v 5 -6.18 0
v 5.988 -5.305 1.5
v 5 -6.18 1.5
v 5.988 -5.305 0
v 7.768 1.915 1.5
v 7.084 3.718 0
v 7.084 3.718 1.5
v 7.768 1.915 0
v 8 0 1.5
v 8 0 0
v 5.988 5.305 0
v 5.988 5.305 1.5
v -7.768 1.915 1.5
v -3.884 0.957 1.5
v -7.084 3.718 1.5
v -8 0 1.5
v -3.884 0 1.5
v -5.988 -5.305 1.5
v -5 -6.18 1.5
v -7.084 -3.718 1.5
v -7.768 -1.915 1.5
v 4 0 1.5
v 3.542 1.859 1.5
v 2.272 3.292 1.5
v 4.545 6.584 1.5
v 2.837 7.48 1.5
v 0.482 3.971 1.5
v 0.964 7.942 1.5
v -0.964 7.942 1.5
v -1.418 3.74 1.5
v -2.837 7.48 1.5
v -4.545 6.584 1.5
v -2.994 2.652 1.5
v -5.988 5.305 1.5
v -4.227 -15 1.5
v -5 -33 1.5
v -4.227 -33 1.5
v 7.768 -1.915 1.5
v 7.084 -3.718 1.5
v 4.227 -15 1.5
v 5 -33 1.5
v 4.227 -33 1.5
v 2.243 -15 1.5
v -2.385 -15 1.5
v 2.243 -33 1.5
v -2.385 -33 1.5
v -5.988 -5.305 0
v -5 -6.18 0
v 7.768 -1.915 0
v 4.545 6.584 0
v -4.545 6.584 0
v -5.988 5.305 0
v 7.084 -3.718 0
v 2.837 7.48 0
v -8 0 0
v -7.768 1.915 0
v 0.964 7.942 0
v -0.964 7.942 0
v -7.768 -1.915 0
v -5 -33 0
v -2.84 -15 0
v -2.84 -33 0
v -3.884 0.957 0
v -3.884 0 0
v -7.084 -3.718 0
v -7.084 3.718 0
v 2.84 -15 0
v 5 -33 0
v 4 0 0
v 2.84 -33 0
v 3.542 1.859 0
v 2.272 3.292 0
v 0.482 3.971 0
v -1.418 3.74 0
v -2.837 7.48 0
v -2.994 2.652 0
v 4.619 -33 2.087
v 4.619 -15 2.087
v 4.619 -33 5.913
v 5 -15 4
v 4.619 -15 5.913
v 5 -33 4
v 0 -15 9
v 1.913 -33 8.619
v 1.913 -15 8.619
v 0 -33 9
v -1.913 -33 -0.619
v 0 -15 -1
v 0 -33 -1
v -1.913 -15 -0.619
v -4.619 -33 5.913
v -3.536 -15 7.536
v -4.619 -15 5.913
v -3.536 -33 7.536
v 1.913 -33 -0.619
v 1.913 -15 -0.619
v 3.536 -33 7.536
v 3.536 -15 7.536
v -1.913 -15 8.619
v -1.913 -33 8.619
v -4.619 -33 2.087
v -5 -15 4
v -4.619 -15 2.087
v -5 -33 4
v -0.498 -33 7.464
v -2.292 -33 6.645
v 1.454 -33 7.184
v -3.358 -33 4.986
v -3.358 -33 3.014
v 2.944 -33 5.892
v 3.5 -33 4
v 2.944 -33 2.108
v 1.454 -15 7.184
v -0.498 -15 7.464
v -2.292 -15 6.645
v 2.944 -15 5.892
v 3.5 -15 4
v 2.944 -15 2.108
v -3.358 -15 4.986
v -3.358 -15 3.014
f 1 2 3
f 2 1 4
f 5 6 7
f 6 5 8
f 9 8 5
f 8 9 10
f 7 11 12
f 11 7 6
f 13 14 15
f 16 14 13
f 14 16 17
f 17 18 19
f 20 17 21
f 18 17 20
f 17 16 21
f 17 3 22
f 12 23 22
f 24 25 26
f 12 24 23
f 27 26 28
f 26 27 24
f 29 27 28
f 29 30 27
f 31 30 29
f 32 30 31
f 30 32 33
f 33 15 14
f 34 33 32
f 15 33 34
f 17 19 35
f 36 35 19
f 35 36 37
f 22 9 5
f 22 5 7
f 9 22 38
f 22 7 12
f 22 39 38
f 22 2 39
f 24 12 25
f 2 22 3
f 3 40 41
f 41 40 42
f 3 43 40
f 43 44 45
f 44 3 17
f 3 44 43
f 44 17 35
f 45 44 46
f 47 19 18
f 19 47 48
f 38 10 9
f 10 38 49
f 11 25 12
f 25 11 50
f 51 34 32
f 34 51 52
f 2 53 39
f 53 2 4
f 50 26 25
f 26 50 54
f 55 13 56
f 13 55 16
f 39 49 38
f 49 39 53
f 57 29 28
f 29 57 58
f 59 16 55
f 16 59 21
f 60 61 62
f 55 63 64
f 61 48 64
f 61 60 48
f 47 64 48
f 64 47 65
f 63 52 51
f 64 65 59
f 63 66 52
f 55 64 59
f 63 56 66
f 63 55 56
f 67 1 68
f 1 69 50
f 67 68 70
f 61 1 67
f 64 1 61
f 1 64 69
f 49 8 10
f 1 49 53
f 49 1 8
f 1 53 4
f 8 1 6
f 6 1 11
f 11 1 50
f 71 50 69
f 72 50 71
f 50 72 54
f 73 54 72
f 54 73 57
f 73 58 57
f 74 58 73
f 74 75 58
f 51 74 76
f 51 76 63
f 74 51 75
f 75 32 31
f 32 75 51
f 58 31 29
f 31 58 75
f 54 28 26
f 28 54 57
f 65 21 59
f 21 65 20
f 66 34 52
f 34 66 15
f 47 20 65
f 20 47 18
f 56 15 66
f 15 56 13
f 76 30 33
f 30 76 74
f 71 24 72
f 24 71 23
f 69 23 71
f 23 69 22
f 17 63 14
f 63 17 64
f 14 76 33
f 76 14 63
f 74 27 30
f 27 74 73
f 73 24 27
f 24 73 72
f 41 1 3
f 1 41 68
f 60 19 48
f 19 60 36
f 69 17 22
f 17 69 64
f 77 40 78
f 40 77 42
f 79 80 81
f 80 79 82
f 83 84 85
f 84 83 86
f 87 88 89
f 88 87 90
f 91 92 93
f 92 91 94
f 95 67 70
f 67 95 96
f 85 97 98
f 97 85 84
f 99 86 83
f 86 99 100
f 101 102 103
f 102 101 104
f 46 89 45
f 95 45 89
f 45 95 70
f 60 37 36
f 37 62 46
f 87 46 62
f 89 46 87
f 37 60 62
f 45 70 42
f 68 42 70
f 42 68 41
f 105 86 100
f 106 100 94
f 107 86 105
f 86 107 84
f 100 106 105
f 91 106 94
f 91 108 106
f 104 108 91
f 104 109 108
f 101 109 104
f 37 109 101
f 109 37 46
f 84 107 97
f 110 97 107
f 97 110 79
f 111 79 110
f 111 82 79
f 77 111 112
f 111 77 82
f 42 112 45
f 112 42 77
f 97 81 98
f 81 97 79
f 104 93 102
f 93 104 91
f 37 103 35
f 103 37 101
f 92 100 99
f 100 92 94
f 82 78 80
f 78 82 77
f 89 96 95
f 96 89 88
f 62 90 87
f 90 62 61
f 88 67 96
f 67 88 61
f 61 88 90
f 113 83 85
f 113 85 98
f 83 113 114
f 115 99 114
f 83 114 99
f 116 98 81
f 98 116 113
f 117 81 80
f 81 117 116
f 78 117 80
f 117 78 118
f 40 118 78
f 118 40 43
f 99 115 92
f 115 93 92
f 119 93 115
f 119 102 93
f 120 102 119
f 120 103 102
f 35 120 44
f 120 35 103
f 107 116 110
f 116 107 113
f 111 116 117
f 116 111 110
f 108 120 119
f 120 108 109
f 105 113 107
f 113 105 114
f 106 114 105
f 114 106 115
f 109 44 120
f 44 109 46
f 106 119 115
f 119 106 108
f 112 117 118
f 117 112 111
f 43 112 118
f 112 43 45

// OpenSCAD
// Parameters
type_selector = 0; //[0:1:1]
thickness_mm = 1.5; //[0.8:3:0.1]
overall_length_mm = 40; //[20:80:1]
tab_width_mm = 10; //[5:20:0.5]
outer_diameter_mm = 16; //[10:32:0.5]
inner_diameter_mm = 8; //[4:20:0.5]
bolt_hole_diameter_mm = 6; //[3:12:0.5]
crimp_length_mm = 18; //[8:40:1]
bend_angle_deg = 45; //[0:90:1]
transition_length_mm = 1; //[0.5:5:0.5]
wire_hole_diameter_mm = 4; //[0:10:0.5]
overlap_mm = 1; //[0.5:2:0.1]
eps_mm = 0.2; //[0.05:0.5:0.05]

// Ring Terminal - complete geometry
module ring_terminal() {
  color("Silver") {
    // Ring
    difference() {
      translate([0, 0, thickness_mm / 2])
        cylinder(r=outer_diameter_mm / 2, h=thickness_mm, center=true);
      translate([0, 0, thickness_mm / 2])
        cylinder(r=inner_diameter_mm / 2, h=thickness_mm + 2 * eps_mm, center=true);
      translate([0, 0, thickness_mm / 2])
        cylinder(r=bolt_hole_diameter_mm / 2, h=thickness_mm + 2 * eps_mm, center=true);
    }
    // Tab
    translate([0, -(overall_length_mm - outer_diameter_mm / 2) / 2, thickness_mm / 2])
      cube([tab_width_mm, overall_length_mm - outer_diameter_mm / 2, thickness_mm], center=true);
  }
}

// Ring Terminal Assembly - complete geometry
module ring_terminal_assembly() {
  if (type_selector == 0) {
    // Crimp Barrel Style
    color("Silver") {
      // Crimp Shell
      difference() {
        translate([0, -(overall_length_mm - outer_diameter_mm / 2) + crimp_length_mm / 2 - overlap_mm, tab_width_mm / 2 - overlap_mm])
          rotate([90, 0, 0])
          cylinder(r=tab_width_mm / 2, h=crimp_length_mm, center=true);
        translate([0, -(overall_length_mm - outer_diameter_mm / 2) + crimp_length_mm / 2 - overlap_mm, tab_width_mm / 2 - overlap_mm])
          rotate([90, 0, 0])
          cylinder(r=tab_width_mm / 2 - thickness_mm, h=crimp_length_mm + 2 * eps_mm, center=true);
      }
      // Transition
      translate([0, -(overall_length_mm - outer_diameter_mm / 2) + transition_length_mm / 2 - overlap_mm, thickness_mm / 2])
        cube([tab_width_mm, transition_length_mm, thickness_mm], center=true);
    }
  } else {
    // Bent Tab Style
    color("Silver") {
      // Bent Tab
      difference() {
        translate([0, -(overall_length_mm - outer_diameter_mm / 2) - (overall_length_mm - outer_diameter_mm / 2 - transition_length_mm) / 2 + overlap_mm, thickness_mm / 2])
          rotate([-bend_angle_deg, 0, 0])
          cube([tab_width_mm, overall_length_mm - outer_diameter_mm / 2 - transition_length_mm, thickness_mm], center=true);
        translate([0, -(overall_length_mm - outer_diameter_mm / 2) + (tab_width_mm / 2), thickness_mm / 2])
          rotate([-bend_angle_deg, 0, 0])
          cylinder(r=wire_hole_diameter_mm / 2, h=thickness_mm + 2 * eps_mm, center=true);
      }
      // Transition
      translate([0, -(overall_length_mm - outer_diameter_mm / 2) + transition_length_mm / 2 - overlap_mm, thickness_mm / 2])
        cube([tab_width_mm, transition_length_mm, thickness_mm], center=true);
    }
  }
}

// Assembly
module assembly() {
  ring_terminal();
  ring_terminal_assembly();
}

assembly();
